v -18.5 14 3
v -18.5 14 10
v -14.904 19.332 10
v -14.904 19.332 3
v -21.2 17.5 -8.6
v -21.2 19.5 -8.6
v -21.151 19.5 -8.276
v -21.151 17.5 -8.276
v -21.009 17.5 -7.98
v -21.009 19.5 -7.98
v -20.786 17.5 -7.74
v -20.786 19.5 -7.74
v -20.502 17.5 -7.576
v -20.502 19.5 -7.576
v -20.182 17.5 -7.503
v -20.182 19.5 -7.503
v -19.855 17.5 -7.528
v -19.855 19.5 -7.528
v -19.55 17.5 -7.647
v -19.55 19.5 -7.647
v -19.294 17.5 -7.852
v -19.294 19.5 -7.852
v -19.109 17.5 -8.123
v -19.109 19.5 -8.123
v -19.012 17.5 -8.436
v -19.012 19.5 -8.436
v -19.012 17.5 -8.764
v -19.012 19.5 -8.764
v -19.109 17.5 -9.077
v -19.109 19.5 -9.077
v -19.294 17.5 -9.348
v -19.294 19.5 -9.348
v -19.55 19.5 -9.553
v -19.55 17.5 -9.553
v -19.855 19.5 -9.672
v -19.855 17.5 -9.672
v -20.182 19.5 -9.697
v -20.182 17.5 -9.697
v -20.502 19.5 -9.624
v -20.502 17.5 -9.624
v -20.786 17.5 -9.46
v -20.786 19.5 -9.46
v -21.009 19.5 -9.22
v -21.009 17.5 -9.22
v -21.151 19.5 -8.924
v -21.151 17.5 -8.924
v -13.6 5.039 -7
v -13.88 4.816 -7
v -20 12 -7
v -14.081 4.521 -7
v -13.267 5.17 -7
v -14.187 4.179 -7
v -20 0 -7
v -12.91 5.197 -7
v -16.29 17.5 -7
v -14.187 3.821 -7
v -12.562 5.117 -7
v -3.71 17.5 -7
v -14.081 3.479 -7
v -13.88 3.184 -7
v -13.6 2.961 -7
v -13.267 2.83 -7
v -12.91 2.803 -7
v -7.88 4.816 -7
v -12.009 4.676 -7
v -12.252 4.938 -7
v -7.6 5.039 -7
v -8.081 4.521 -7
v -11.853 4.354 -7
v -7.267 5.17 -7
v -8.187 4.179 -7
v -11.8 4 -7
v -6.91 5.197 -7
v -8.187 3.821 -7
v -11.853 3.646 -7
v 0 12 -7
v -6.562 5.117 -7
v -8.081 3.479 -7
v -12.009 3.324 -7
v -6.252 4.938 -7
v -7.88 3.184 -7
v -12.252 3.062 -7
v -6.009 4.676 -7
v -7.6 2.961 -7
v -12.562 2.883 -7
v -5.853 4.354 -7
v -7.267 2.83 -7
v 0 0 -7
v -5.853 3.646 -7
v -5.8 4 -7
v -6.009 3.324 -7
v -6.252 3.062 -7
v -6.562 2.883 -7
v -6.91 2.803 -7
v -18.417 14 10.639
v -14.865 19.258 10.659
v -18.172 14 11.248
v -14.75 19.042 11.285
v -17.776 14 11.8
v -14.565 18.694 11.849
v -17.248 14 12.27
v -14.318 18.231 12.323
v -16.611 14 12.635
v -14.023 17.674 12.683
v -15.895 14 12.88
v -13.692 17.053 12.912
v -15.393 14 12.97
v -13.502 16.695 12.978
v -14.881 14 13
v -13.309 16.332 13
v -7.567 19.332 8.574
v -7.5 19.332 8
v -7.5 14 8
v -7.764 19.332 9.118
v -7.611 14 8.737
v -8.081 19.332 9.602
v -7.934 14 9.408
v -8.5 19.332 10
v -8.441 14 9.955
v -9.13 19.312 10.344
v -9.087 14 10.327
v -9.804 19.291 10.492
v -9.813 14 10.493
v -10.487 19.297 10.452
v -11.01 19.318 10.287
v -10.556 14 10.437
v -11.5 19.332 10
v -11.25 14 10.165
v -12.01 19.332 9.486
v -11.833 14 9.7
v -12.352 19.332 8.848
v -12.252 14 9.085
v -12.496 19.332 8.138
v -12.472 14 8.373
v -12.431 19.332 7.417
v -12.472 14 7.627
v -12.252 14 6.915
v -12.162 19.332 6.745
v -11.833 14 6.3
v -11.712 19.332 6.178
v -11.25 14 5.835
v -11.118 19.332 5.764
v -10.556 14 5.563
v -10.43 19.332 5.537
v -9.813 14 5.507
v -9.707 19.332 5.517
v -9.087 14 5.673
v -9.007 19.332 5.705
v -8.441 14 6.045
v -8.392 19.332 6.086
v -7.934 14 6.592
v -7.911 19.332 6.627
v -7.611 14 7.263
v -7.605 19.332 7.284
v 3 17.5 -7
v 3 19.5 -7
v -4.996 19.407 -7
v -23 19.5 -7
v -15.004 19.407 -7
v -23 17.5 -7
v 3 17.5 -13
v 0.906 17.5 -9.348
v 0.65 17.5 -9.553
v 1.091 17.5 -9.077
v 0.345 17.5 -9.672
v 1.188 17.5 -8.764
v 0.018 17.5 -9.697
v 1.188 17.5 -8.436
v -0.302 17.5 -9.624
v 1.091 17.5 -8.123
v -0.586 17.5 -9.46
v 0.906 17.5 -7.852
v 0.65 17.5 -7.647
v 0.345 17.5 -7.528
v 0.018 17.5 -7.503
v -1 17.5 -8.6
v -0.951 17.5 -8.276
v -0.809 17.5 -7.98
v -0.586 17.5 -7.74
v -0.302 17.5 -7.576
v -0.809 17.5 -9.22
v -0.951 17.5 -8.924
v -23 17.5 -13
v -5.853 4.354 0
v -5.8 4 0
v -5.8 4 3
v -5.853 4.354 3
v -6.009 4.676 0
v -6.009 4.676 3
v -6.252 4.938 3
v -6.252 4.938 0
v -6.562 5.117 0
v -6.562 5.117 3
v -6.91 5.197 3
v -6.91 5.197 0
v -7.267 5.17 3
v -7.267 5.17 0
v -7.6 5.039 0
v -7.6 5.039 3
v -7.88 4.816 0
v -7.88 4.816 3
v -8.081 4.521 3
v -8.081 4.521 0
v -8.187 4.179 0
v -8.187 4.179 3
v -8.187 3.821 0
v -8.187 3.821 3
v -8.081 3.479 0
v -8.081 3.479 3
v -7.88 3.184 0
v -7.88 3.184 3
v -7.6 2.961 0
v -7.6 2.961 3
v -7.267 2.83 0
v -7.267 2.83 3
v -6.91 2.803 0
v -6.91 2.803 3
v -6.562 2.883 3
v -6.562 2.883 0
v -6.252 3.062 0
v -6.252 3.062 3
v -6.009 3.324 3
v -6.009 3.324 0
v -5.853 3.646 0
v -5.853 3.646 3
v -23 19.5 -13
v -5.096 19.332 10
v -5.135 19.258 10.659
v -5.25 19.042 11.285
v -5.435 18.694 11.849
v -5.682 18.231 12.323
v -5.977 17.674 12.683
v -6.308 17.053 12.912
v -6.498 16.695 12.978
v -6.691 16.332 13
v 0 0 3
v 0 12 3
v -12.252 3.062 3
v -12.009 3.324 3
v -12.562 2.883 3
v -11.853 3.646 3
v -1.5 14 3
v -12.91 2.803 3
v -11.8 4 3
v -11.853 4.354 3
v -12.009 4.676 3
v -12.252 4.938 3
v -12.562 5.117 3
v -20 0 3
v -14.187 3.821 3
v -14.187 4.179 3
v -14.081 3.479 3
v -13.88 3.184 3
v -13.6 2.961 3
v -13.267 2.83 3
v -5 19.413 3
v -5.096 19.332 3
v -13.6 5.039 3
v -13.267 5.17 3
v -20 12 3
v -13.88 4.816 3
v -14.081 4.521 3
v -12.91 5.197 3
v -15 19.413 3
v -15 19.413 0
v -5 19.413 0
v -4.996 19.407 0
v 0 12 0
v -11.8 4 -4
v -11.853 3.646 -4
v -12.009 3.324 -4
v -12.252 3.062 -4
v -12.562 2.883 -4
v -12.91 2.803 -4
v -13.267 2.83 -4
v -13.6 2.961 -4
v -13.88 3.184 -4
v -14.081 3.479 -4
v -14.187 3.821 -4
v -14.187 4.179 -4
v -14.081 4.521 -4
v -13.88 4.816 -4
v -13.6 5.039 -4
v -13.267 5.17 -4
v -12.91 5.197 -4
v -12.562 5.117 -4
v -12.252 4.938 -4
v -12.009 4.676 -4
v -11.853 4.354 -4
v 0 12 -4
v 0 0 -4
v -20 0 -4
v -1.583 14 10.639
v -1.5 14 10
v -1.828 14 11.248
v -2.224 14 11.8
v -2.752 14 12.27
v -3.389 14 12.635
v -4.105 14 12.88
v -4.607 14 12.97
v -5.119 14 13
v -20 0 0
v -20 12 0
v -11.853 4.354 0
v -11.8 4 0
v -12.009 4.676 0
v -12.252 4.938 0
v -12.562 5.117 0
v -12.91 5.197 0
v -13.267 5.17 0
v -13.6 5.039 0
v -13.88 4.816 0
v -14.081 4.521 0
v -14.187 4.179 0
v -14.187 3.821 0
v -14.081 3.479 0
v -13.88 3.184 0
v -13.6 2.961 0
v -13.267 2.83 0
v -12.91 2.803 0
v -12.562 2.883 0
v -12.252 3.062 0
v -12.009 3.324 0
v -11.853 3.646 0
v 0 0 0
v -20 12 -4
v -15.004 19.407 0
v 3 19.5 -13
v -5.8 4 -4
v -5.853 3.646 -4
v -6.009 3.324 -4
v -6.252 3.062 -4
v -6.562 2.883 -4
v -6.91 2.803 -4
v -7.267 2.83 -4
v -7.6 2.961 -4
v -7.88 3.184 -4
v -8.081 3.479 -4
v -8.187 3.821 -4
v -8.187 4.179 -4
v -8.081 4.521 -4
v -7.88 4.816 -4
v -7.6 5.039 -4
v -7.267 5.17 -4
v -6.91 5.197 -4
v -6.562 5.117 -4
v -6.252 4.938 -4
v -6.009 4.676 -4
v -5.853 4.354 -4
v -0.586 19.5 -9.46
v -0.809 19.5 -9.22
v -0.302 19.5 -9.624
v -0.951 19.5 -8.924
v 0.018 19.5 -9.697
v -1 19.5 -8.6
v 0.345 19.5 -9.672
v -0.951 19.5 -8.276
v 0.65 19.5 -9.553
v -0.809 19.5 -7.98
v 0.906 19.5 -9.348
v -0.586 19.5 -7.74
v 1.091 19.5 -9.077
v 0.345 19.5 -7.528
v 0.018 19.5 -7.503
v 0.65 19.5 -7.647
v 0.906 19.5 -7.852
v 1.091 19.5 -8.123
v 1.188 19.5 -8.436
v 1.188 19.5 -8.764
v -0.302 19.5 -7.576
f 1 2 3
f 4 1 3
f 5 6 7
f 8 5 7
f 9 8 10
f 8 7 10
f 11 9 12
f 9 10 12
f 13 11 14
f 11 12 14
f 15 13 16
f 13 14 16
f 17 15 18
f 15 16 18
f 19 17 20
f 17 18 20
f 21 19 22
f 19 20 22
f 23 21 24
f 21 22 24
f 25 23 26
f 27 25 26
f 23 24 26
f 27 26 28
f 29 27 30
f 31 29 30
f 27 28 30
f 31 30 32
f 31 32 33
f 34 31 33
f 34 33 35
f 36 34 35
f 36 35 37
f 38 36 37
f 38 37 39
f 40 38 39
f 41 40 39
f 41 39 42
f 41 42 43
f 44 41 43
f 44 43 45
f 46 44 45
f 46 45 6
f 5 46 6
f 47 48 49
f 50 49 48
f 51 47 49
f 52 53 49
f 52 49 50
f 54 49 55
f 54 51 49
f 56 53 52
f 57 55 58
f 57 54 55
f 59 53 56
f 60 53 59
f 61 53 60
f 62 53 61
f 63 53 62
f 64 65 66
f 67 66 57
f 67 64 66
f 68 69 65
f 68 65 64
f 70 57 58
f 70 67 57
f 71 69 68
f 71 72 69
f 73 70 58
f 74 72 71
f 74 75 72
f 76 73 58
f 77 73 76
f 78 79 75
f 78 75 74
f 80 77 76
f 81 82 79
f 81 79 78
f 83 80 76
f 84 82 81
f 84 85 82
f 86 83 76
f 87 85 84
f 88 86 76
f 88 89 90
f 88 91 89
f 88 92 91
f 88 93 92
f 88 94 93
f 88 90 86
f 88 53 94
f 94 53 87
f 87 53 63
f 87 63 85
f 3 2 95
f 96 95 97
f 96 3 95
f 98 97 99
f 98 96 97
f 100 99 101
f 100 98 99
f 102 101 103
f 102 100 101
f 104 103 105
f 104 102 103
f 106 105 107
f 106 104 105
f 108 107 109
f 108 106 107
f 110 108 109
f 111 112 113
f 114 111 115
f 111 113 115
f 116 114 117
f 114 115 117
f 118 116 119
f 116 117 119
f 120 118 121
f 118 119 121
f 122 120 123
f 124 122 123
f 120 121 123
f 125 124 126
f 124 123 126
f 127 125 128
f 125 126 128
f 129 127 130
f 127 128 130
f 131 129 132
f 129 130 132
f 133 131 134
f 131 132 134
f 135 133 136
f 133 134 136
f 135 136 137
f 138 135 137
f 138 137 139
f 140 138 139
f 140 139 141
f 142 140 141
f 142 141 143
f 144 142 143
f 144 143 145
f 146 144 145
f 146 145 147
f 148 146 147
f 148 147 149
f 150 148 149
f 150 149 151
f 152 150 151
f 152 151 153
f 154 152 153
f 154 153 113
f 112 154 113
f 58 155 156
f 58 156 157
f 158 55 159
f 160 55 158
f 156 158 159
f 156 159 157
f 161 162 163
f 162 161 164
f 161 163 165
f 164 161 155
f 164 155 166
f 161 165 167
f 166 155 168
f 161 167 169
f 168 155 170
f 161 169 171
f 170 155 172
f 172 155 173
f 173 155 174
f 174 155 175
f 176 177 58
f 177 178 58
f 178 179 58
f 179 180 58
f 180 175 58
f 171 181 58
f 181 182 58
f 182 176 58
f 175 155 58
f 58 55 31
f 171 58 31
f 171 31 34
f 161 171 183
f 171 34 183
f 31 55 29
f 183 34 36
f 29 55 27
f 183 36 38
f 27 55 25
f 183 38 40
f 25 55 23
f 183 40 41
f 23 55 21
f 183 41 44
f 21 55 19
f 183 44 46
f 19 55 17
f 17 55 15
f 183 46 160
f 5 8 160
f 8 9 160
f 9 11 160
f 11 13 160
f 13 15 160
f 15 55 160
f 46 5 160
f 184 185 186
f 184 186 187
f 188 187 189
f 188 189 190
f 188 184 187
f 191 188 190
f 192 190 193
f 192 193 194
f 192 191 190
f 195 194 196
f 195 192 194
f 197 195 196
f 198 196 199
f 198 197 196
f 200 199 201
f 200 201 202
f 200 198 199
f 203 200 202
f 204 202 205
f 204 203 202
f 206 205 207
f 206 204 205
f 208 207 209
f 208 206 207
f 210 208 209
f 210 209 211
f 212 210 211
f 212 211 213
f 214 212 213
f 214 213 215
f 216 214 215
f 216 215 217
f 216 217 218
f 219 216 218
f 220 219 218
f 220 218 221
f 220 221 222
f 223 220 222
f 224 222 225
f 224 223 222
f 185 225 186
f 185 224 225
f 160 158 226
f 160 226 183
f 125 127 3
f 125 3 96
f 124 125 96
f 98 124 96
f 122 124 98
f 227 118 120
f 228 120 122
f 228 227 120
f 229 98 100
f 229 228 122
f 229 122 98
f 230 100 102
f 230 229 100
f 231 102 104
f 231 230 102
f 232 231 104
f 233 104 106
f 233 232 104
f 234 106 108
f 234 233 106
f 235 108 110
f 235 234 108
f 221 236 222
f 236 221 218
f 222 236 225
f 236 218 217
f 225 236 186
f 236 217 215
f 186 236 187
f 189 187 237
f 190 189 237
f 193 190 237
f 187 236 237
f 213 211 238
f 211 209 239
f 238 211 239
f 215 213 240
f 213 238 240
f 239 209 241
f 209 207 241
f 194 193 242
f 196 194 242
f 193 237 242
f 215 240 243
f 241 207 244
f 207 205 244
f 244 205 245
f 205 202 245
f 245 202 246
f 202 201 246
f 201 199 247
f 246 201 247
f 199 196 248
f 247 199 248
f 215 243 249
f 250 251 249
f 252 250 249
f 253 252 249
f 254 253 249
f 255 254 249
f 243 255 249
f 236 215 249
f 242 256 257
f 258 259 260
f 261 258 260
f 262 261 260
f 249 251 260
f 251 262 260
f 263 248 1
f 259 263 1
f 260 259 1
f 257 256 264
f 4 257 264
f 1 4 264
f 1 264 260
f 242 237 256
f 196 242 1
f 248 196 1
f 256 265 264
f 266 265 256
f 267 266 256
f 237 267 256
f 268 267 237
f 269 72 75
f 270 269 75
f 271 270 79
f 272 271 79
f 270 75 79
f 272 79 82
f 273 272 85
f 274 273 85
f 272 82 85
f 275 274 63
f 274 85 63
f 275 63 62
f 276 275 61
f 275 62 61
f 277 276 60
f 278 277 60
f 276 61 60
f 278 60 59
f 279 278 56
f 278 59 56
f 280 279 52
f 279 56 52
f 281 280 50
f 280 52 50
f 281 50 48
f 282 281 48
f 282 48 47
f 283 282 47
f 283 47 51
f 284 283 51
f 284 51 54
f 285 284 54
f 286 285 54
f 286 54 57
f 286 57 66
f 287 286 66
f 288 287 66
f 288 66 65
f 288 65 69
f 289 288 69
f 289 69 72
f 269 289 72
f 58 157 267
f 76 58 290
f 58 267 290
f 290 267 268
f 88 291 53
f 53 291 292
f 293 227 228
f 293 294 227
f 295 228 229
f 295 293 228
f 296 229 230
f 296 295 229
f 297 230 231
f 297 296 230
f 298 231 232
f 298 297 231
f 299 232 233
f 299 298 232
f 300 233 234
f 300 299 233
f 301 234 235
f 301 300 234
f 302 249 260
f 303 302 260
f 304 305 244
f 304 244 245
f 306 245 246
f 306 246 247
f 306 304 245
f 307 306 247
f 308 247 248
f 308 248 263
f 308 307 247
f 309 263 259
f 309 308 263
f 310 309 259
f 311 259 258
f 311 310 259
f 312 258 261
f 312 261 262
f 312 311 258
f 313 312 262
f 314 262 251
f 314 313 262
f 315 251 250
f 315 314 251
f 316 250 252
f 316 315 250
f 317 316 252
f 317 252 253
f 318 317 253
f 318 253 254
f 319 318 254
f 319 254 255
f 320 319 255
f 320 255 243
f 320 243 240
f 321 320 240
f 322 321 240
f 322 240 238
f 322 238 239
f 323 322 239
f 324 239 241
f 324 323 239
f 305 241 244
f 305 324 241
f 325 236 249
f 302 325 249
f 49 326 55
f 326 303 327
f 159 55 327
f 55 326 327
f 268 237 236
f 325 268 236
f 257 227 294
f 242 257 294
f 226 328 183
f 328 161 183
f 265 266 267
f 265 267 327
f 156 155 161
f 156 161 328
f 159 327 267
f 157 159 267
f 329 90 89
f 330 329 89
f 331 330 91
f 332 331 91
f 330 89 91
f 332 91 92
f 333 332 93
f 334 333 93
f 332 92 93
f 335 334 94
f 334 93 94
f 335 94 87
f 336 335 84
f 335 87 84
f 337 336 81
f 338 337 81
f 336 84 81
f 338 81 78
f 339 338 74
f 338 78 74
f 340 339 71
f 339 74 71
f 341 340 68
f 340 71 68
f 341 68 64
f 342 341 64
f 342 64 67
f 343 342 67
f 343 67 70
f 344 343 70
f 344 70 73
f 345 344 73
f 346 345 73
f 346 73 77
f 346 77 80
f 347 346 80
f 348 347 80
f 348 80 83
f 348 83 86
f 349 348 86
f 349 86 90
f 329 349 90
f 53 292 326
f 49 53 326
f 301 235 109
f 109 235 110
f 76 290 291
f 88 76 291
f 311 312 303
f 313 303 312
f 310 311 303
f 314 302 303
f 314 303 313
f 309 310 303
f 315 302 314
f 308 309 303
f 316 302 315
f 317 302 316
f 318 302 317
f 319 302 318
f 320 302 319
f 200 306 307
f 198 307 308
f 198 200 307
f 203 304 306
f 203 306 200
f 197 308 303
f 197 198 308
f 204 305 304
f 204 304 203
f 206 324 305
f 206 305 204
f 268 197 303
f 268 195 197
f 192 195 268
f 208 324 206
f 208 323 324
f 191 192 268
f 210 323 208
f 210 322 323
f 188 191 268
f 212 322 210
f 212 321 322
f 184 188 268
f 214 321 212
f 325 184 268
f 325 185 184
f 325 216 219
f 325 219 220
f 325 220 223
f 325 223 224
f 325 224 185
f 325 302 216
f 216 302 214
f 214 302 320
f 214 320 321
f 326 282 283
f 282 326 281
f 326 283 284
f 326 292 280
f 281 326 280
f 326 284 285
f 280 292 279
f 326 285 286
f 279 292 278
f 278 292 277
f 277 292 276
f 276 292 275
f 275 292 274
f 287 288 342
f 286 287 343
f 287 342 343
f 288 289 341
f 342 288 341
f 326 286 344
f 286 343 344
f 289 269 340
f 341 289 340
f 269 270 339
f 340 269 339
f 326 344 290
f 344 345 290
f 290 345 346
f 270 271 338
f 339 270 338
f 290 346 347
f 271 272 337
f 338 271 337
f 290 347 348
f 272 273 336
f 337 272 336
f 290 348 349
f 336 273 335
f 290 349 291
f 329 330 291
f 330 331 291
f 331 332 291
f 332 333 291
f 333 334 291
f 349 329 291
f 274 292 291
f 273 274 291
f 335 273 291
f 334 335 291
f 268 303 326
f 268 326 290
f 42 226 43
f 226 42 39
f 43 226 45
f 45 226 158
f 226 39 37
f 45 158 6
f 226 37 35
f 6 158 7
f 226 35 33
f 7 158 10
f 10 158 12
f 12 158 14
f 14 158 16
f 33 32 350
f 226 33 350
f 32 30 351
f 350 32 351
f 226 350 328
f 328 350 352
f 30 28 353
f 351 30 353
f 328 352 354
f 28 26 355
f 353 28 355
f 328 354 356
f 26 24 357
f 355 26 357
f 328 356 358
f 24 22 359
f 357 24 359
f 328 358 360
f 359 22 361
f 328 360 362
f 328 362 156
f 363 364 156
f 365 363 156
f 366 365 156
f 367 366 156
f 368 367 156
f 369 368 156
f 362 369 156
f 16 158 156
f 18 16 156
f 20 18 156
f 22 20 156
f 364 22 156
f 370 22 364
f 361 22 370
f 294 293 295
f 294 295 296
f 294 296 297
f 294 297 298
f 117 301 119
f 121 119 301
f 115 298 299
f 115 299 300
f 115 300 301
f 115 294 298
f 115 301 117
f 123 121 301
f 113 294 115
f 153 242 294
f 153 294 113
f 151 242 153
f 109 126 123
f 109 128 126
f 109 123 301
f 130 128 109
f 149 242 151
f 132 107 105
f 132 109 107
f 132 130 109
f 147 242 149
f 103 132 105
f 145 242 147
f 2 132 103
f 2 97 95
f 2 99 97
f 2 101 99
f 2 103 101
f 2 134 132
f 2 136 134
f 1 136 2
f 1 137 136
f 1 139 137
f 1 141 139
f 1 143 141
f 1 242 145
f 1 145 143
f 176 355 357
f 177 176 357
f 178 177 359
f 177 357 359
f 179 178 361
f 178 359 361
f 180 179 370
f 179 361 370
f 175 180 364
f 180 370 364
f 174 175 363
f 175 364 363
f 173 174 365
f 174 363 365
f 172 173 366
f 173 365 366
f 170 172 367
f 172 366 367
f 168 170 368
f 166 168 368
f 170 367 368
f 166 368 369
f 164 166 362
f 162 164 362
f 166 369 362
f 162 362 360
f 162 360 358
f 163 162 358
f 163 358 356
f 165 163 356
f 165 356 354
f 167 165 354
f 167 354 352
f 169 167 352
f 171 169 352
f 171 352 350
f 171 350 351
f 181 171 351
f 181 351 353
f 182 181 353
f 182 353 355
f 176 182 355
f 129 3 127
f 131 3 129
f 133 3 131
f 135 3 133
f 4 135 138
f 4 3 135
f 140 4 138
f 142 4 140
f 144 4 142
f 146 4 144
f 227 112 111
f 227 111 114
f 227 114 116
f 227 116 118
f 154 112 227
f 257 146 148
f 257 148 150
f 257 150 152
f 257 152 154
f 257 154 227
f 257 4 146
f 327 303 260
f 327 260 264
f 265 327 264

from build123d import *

# Parameters (mm, degrees)
SKETCH_R        = 1.2
PAD_DEPTH       = 3
PAD001_DEPTH    = 10
FILLET_R        = 3
SKETCH002_R     = 2.5
POCKET_DEPTH    = 6
PAD002_DEPTH    = 7
SKETCH004_W     = 20
SKETCH004_H     = 4
POCKET001_DEPTH = 12
SKETCH006_R     = 1.2
POCKET002_DEPTH = 5
PAD003_DEPTH    = 6
SKETCH008_R     = 1.1
POCKET003_DEPTH = 5


with BuildPart() as part:
    # Sketch → Pad (new body)
    with BuildSketch(Plane.XY):
        Polygon((0, 12), (0, 0), (-20, 0), (-20, 12), (-15, 19.412805), (-5, 19.412805), align=None)
        with Locations((-13, 4)):
            Circle(SKETCH_R, mode=Mode.SUBTRACT)
        with Locations((-7, 4)):
            Circle(SKETCH_R, mode=Mode.SUBTRACT)
    extrude(amount=PAD_DEPTH)

    # Sketch001 (on Face10 of Pad) → Pad001 (join)
    with BuildSketch(Plane.XY.offset(3)):
        Polygon((-14.90374, 19.331674), (-5.09626, 19.331674), (-1.5, 14), (-18.5, 14), align=None)
    extrude(amount=PAD001_DEPTH)

    # Fillet
    fillet_edges = [part.edges().sort_by_distance(p)[0] for p in [
        (-3.29813, 16.665837, 13),
        (-10, 19.331674, 13),
        (-16.70187, 16.665837, 13),
    ]]
    fillet(fillet_edges, radius=FILLET_R)

    # Sketch002 (on Face12 of Pad001) → Pocket (cut)
    with BuildSketch(Plane.XZ.offset(-14)):
        with Locations((-10, 8)):
            Circle(SKETCH002_R)
    extrude(amount=-POCKET_DEPTH, mode=Mode.SUBTRACT)

    # Sketch003 (on Face19 of Pocket) → Pad002 (join)
    with BuildSketch(Plane(origin=(0, 0, 0), x_dir=(1, 0, 0), z_dir=(0, 0, -1))):
        Polygon((0, 0), (-20, 0), (-20, -12), (-15.004024, -19.406839), (-4.995976, -19.406839), (0, -12), align=None)
    extrude(amount=PAD002_DEPTH)

    # Sketch004 (on Face22 of Pad002) → Pocket001 (cut)
    with BuildSketch(Plane.XZ):
        with Locations((-10, -2)):
            Rectangle(SKETCH004_W, SKETCH004_H)
    extrude(amount=-POCKET001_DEPTH, mode=Mode.SUBTRACT)

    # Sketch006 (on Face26 of Pocket001) → Pocket002 (cut)
    with BuildSketch(Plane(origin=(0, 0, -7), x_dir=(1, 0, 0), z_dir=(0, 0, -1))):
        with Locations((-13, -4)):
            Circle(SKETCH006_R)
        with Locations((-7, -4)):
            Circle(SKETCH006_R)
    extrude(amount=-POCKET002_DEPTH, mode=Mode.SUBTRACT)

    # Sketch007 (on Face26 of Pocket002) → Pad003 (join)
    with BuildSketch(Plane(origin=(0, 0, -7), x_dir=(1, 0, 0), z_dir=(0, 0, -1))):
        Polygon((-10, -19.5), (-23, -19.5), (-23, -17.5), (-10, -17.5), (3, -17.5), (3, -19.5), align=None)
    extrude(amount=PAD003_DEPTH)

    # Sketch008 (on Face38 of Pad003) → Pocket003 (cut)
    with BuildSketch(Plane(origin=(0, 19.5, 0), x_dir=(-1, 0, 0), z_dir=(0, 1, 0))):
        with Locations((20.1, -8.6)):
            Circle(SKETCH008_R)
        with Locations((-0.1, -8.6)):
            Circle(SKETCH008_R)
    extrude(amount=-POCKET003_DEPTH, mode=Mode.SUBTRACT)


solid = part.part
